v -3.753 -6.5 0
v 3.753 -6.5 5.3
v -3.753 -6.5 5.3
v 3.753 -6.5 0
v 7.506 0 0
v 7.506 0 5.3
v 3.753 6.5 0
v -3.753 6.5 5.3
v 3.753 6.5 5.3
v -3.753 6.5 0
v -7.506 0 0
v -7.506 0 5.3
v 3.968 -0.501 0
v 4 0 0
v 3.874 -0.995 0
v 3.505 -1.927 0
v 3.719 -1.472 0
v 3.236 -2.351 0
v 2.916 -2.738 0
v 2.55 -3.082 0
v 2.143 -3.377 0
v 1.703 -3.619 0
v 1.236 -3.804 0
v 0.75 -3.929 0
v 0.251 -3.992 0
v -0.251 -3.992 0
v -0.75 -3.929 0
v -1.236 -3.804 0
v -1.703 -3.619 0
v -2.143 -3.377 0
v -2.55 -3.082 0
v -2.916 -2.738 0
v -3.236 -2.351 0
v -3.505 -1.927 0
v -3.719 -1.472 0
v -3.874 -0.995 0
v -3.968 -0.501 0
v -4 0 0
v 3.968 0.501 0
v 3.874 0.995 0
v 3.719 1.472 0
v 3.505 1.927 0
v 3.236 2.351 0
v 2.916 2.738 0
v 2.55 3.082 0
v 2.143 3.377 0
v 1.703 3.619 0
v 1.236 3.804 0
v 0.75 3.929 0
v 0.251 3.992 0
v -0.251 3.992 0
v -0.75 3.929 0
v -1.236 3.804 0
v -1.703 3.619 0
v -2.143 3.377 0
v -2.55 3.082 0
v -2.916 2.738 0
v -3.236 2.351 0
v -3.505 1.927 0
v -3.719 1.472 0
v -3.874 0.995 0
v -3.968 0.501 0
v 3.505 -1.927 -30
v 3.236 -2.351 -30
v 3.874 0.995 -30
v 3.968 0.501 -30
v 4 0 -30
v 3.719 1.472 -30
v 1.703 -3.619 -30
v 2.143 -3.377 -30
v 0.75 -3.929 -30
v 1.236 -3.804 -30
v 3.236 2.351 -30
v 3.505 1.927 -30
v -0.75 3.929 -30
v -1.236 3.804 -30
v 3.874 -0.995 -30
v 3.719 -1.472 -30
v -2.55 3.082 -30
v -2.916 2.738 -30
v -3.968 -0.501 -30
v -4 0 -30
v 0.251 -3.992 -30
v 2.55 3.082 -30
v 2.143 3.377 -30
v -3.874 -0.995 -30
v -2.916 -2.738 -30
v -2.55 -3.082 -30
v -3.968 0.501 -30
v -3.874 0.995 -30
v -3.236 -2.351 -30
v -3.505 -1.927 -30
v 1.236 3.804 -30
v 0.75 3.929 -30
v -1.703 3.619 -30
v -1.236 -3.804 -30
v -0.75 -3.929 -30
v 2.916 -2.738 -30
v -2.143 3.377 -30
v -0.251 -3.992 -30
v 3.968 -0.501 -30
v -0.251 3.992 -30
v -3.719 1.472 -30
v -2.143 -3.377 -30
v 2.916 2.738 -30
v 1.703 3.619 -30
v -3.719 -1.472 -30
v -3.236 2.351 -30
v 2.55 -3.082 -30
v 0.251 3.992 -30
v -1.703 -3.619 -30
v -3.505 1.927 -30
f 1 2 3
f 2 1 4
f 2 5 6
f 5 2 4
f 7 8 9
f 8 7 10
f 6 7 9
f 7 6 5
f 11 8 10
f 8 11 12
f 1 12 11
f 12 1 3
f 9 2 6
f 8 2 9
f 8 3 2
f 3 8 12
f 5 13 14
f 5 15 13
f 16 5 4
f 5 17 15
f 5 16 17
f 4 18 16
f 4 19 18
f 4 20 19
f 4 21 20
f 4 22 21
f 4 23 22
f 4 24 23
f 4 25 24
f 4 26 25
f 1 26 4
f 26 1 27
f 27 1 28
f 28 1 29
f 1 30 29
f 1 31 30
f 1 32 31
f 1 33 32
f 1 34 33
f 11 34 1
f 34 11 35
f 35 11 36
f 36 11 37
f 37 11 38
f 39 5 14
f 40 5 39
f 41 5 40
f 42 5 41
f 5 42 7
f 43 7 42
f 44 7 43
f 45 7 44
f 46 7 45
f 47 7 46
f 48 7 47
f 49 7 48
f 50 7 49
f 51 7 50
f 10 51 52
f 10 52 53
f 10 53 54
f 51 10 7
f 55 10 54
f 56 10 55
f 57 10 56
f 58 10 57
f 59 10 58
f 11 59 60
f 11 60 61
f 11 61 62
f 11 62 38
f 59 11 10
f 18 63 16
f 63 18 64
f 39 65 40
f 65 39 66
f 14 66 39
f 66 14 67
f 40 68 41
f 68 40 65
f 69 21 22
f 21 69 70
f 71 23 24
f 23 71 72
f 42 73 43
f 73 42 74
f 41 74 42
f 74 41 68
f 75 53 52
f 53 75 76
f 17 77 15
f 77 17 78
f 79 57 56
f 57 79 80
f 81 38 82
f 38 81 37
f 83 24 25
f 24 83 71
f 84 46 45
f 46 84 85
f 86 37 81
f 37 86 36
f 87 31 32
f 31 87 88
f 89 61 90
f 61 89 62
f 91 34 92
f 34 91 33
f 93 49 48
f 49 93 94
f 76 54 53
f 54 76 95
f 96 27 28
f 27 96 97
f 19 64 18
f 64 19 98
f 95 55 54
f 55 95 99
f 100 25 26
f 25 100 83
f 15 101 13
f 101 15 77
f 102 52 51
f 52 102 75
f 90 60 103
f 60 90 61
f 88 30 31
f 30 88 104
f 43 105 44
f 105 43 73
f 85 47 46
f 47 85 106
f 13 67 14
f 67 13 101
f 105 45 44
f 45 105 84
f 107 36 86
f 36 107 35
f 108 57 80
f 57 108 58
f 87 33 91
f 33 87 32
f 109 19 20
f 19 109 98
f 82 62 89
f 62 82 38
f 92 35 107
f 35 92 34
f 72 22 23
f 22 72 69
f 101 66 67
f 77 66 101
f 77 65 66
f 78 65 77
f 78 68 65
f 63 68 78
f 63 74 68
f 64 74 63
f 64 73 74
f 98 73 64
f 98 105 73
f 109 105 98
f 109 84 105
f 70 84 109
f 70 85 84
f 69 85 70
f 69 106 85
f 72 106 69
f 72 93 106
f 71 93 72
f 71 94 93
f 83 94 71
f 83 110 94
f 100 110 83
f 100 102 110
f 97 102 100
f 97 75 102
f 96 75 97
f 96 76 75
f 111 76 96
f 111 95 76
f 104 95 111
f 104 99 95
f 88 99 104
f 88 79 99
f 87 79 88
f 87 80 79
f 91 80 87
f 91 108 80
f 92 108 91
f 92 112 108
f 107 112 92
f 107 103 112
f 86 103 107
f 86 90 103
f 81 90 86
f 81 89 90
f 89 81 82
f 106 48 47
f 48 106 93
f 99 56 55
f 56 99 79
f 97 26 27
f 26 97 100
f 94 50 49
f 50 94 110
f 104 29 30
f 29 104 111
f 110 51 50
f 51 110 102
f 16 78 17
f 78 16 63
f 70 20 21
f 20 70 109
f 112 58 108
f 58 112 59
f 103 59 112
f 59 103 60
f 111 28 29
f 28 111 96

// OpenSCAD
$fn = 50;

// M8 Hex Bolt

// Head: Across-flats 13mm, Height 5.3mm
// Position: Bottom at z=0
translate([0, 0, 0])
    cylinder(h = 5.3, r = 6.5 / cos(30), $fn = 6);

// Shank: Diameter 8mm, Length 30mm
// Position: Extending towards z < 0
translate([0, 0, -30])
    cylinder(h = 30, d = 8);
